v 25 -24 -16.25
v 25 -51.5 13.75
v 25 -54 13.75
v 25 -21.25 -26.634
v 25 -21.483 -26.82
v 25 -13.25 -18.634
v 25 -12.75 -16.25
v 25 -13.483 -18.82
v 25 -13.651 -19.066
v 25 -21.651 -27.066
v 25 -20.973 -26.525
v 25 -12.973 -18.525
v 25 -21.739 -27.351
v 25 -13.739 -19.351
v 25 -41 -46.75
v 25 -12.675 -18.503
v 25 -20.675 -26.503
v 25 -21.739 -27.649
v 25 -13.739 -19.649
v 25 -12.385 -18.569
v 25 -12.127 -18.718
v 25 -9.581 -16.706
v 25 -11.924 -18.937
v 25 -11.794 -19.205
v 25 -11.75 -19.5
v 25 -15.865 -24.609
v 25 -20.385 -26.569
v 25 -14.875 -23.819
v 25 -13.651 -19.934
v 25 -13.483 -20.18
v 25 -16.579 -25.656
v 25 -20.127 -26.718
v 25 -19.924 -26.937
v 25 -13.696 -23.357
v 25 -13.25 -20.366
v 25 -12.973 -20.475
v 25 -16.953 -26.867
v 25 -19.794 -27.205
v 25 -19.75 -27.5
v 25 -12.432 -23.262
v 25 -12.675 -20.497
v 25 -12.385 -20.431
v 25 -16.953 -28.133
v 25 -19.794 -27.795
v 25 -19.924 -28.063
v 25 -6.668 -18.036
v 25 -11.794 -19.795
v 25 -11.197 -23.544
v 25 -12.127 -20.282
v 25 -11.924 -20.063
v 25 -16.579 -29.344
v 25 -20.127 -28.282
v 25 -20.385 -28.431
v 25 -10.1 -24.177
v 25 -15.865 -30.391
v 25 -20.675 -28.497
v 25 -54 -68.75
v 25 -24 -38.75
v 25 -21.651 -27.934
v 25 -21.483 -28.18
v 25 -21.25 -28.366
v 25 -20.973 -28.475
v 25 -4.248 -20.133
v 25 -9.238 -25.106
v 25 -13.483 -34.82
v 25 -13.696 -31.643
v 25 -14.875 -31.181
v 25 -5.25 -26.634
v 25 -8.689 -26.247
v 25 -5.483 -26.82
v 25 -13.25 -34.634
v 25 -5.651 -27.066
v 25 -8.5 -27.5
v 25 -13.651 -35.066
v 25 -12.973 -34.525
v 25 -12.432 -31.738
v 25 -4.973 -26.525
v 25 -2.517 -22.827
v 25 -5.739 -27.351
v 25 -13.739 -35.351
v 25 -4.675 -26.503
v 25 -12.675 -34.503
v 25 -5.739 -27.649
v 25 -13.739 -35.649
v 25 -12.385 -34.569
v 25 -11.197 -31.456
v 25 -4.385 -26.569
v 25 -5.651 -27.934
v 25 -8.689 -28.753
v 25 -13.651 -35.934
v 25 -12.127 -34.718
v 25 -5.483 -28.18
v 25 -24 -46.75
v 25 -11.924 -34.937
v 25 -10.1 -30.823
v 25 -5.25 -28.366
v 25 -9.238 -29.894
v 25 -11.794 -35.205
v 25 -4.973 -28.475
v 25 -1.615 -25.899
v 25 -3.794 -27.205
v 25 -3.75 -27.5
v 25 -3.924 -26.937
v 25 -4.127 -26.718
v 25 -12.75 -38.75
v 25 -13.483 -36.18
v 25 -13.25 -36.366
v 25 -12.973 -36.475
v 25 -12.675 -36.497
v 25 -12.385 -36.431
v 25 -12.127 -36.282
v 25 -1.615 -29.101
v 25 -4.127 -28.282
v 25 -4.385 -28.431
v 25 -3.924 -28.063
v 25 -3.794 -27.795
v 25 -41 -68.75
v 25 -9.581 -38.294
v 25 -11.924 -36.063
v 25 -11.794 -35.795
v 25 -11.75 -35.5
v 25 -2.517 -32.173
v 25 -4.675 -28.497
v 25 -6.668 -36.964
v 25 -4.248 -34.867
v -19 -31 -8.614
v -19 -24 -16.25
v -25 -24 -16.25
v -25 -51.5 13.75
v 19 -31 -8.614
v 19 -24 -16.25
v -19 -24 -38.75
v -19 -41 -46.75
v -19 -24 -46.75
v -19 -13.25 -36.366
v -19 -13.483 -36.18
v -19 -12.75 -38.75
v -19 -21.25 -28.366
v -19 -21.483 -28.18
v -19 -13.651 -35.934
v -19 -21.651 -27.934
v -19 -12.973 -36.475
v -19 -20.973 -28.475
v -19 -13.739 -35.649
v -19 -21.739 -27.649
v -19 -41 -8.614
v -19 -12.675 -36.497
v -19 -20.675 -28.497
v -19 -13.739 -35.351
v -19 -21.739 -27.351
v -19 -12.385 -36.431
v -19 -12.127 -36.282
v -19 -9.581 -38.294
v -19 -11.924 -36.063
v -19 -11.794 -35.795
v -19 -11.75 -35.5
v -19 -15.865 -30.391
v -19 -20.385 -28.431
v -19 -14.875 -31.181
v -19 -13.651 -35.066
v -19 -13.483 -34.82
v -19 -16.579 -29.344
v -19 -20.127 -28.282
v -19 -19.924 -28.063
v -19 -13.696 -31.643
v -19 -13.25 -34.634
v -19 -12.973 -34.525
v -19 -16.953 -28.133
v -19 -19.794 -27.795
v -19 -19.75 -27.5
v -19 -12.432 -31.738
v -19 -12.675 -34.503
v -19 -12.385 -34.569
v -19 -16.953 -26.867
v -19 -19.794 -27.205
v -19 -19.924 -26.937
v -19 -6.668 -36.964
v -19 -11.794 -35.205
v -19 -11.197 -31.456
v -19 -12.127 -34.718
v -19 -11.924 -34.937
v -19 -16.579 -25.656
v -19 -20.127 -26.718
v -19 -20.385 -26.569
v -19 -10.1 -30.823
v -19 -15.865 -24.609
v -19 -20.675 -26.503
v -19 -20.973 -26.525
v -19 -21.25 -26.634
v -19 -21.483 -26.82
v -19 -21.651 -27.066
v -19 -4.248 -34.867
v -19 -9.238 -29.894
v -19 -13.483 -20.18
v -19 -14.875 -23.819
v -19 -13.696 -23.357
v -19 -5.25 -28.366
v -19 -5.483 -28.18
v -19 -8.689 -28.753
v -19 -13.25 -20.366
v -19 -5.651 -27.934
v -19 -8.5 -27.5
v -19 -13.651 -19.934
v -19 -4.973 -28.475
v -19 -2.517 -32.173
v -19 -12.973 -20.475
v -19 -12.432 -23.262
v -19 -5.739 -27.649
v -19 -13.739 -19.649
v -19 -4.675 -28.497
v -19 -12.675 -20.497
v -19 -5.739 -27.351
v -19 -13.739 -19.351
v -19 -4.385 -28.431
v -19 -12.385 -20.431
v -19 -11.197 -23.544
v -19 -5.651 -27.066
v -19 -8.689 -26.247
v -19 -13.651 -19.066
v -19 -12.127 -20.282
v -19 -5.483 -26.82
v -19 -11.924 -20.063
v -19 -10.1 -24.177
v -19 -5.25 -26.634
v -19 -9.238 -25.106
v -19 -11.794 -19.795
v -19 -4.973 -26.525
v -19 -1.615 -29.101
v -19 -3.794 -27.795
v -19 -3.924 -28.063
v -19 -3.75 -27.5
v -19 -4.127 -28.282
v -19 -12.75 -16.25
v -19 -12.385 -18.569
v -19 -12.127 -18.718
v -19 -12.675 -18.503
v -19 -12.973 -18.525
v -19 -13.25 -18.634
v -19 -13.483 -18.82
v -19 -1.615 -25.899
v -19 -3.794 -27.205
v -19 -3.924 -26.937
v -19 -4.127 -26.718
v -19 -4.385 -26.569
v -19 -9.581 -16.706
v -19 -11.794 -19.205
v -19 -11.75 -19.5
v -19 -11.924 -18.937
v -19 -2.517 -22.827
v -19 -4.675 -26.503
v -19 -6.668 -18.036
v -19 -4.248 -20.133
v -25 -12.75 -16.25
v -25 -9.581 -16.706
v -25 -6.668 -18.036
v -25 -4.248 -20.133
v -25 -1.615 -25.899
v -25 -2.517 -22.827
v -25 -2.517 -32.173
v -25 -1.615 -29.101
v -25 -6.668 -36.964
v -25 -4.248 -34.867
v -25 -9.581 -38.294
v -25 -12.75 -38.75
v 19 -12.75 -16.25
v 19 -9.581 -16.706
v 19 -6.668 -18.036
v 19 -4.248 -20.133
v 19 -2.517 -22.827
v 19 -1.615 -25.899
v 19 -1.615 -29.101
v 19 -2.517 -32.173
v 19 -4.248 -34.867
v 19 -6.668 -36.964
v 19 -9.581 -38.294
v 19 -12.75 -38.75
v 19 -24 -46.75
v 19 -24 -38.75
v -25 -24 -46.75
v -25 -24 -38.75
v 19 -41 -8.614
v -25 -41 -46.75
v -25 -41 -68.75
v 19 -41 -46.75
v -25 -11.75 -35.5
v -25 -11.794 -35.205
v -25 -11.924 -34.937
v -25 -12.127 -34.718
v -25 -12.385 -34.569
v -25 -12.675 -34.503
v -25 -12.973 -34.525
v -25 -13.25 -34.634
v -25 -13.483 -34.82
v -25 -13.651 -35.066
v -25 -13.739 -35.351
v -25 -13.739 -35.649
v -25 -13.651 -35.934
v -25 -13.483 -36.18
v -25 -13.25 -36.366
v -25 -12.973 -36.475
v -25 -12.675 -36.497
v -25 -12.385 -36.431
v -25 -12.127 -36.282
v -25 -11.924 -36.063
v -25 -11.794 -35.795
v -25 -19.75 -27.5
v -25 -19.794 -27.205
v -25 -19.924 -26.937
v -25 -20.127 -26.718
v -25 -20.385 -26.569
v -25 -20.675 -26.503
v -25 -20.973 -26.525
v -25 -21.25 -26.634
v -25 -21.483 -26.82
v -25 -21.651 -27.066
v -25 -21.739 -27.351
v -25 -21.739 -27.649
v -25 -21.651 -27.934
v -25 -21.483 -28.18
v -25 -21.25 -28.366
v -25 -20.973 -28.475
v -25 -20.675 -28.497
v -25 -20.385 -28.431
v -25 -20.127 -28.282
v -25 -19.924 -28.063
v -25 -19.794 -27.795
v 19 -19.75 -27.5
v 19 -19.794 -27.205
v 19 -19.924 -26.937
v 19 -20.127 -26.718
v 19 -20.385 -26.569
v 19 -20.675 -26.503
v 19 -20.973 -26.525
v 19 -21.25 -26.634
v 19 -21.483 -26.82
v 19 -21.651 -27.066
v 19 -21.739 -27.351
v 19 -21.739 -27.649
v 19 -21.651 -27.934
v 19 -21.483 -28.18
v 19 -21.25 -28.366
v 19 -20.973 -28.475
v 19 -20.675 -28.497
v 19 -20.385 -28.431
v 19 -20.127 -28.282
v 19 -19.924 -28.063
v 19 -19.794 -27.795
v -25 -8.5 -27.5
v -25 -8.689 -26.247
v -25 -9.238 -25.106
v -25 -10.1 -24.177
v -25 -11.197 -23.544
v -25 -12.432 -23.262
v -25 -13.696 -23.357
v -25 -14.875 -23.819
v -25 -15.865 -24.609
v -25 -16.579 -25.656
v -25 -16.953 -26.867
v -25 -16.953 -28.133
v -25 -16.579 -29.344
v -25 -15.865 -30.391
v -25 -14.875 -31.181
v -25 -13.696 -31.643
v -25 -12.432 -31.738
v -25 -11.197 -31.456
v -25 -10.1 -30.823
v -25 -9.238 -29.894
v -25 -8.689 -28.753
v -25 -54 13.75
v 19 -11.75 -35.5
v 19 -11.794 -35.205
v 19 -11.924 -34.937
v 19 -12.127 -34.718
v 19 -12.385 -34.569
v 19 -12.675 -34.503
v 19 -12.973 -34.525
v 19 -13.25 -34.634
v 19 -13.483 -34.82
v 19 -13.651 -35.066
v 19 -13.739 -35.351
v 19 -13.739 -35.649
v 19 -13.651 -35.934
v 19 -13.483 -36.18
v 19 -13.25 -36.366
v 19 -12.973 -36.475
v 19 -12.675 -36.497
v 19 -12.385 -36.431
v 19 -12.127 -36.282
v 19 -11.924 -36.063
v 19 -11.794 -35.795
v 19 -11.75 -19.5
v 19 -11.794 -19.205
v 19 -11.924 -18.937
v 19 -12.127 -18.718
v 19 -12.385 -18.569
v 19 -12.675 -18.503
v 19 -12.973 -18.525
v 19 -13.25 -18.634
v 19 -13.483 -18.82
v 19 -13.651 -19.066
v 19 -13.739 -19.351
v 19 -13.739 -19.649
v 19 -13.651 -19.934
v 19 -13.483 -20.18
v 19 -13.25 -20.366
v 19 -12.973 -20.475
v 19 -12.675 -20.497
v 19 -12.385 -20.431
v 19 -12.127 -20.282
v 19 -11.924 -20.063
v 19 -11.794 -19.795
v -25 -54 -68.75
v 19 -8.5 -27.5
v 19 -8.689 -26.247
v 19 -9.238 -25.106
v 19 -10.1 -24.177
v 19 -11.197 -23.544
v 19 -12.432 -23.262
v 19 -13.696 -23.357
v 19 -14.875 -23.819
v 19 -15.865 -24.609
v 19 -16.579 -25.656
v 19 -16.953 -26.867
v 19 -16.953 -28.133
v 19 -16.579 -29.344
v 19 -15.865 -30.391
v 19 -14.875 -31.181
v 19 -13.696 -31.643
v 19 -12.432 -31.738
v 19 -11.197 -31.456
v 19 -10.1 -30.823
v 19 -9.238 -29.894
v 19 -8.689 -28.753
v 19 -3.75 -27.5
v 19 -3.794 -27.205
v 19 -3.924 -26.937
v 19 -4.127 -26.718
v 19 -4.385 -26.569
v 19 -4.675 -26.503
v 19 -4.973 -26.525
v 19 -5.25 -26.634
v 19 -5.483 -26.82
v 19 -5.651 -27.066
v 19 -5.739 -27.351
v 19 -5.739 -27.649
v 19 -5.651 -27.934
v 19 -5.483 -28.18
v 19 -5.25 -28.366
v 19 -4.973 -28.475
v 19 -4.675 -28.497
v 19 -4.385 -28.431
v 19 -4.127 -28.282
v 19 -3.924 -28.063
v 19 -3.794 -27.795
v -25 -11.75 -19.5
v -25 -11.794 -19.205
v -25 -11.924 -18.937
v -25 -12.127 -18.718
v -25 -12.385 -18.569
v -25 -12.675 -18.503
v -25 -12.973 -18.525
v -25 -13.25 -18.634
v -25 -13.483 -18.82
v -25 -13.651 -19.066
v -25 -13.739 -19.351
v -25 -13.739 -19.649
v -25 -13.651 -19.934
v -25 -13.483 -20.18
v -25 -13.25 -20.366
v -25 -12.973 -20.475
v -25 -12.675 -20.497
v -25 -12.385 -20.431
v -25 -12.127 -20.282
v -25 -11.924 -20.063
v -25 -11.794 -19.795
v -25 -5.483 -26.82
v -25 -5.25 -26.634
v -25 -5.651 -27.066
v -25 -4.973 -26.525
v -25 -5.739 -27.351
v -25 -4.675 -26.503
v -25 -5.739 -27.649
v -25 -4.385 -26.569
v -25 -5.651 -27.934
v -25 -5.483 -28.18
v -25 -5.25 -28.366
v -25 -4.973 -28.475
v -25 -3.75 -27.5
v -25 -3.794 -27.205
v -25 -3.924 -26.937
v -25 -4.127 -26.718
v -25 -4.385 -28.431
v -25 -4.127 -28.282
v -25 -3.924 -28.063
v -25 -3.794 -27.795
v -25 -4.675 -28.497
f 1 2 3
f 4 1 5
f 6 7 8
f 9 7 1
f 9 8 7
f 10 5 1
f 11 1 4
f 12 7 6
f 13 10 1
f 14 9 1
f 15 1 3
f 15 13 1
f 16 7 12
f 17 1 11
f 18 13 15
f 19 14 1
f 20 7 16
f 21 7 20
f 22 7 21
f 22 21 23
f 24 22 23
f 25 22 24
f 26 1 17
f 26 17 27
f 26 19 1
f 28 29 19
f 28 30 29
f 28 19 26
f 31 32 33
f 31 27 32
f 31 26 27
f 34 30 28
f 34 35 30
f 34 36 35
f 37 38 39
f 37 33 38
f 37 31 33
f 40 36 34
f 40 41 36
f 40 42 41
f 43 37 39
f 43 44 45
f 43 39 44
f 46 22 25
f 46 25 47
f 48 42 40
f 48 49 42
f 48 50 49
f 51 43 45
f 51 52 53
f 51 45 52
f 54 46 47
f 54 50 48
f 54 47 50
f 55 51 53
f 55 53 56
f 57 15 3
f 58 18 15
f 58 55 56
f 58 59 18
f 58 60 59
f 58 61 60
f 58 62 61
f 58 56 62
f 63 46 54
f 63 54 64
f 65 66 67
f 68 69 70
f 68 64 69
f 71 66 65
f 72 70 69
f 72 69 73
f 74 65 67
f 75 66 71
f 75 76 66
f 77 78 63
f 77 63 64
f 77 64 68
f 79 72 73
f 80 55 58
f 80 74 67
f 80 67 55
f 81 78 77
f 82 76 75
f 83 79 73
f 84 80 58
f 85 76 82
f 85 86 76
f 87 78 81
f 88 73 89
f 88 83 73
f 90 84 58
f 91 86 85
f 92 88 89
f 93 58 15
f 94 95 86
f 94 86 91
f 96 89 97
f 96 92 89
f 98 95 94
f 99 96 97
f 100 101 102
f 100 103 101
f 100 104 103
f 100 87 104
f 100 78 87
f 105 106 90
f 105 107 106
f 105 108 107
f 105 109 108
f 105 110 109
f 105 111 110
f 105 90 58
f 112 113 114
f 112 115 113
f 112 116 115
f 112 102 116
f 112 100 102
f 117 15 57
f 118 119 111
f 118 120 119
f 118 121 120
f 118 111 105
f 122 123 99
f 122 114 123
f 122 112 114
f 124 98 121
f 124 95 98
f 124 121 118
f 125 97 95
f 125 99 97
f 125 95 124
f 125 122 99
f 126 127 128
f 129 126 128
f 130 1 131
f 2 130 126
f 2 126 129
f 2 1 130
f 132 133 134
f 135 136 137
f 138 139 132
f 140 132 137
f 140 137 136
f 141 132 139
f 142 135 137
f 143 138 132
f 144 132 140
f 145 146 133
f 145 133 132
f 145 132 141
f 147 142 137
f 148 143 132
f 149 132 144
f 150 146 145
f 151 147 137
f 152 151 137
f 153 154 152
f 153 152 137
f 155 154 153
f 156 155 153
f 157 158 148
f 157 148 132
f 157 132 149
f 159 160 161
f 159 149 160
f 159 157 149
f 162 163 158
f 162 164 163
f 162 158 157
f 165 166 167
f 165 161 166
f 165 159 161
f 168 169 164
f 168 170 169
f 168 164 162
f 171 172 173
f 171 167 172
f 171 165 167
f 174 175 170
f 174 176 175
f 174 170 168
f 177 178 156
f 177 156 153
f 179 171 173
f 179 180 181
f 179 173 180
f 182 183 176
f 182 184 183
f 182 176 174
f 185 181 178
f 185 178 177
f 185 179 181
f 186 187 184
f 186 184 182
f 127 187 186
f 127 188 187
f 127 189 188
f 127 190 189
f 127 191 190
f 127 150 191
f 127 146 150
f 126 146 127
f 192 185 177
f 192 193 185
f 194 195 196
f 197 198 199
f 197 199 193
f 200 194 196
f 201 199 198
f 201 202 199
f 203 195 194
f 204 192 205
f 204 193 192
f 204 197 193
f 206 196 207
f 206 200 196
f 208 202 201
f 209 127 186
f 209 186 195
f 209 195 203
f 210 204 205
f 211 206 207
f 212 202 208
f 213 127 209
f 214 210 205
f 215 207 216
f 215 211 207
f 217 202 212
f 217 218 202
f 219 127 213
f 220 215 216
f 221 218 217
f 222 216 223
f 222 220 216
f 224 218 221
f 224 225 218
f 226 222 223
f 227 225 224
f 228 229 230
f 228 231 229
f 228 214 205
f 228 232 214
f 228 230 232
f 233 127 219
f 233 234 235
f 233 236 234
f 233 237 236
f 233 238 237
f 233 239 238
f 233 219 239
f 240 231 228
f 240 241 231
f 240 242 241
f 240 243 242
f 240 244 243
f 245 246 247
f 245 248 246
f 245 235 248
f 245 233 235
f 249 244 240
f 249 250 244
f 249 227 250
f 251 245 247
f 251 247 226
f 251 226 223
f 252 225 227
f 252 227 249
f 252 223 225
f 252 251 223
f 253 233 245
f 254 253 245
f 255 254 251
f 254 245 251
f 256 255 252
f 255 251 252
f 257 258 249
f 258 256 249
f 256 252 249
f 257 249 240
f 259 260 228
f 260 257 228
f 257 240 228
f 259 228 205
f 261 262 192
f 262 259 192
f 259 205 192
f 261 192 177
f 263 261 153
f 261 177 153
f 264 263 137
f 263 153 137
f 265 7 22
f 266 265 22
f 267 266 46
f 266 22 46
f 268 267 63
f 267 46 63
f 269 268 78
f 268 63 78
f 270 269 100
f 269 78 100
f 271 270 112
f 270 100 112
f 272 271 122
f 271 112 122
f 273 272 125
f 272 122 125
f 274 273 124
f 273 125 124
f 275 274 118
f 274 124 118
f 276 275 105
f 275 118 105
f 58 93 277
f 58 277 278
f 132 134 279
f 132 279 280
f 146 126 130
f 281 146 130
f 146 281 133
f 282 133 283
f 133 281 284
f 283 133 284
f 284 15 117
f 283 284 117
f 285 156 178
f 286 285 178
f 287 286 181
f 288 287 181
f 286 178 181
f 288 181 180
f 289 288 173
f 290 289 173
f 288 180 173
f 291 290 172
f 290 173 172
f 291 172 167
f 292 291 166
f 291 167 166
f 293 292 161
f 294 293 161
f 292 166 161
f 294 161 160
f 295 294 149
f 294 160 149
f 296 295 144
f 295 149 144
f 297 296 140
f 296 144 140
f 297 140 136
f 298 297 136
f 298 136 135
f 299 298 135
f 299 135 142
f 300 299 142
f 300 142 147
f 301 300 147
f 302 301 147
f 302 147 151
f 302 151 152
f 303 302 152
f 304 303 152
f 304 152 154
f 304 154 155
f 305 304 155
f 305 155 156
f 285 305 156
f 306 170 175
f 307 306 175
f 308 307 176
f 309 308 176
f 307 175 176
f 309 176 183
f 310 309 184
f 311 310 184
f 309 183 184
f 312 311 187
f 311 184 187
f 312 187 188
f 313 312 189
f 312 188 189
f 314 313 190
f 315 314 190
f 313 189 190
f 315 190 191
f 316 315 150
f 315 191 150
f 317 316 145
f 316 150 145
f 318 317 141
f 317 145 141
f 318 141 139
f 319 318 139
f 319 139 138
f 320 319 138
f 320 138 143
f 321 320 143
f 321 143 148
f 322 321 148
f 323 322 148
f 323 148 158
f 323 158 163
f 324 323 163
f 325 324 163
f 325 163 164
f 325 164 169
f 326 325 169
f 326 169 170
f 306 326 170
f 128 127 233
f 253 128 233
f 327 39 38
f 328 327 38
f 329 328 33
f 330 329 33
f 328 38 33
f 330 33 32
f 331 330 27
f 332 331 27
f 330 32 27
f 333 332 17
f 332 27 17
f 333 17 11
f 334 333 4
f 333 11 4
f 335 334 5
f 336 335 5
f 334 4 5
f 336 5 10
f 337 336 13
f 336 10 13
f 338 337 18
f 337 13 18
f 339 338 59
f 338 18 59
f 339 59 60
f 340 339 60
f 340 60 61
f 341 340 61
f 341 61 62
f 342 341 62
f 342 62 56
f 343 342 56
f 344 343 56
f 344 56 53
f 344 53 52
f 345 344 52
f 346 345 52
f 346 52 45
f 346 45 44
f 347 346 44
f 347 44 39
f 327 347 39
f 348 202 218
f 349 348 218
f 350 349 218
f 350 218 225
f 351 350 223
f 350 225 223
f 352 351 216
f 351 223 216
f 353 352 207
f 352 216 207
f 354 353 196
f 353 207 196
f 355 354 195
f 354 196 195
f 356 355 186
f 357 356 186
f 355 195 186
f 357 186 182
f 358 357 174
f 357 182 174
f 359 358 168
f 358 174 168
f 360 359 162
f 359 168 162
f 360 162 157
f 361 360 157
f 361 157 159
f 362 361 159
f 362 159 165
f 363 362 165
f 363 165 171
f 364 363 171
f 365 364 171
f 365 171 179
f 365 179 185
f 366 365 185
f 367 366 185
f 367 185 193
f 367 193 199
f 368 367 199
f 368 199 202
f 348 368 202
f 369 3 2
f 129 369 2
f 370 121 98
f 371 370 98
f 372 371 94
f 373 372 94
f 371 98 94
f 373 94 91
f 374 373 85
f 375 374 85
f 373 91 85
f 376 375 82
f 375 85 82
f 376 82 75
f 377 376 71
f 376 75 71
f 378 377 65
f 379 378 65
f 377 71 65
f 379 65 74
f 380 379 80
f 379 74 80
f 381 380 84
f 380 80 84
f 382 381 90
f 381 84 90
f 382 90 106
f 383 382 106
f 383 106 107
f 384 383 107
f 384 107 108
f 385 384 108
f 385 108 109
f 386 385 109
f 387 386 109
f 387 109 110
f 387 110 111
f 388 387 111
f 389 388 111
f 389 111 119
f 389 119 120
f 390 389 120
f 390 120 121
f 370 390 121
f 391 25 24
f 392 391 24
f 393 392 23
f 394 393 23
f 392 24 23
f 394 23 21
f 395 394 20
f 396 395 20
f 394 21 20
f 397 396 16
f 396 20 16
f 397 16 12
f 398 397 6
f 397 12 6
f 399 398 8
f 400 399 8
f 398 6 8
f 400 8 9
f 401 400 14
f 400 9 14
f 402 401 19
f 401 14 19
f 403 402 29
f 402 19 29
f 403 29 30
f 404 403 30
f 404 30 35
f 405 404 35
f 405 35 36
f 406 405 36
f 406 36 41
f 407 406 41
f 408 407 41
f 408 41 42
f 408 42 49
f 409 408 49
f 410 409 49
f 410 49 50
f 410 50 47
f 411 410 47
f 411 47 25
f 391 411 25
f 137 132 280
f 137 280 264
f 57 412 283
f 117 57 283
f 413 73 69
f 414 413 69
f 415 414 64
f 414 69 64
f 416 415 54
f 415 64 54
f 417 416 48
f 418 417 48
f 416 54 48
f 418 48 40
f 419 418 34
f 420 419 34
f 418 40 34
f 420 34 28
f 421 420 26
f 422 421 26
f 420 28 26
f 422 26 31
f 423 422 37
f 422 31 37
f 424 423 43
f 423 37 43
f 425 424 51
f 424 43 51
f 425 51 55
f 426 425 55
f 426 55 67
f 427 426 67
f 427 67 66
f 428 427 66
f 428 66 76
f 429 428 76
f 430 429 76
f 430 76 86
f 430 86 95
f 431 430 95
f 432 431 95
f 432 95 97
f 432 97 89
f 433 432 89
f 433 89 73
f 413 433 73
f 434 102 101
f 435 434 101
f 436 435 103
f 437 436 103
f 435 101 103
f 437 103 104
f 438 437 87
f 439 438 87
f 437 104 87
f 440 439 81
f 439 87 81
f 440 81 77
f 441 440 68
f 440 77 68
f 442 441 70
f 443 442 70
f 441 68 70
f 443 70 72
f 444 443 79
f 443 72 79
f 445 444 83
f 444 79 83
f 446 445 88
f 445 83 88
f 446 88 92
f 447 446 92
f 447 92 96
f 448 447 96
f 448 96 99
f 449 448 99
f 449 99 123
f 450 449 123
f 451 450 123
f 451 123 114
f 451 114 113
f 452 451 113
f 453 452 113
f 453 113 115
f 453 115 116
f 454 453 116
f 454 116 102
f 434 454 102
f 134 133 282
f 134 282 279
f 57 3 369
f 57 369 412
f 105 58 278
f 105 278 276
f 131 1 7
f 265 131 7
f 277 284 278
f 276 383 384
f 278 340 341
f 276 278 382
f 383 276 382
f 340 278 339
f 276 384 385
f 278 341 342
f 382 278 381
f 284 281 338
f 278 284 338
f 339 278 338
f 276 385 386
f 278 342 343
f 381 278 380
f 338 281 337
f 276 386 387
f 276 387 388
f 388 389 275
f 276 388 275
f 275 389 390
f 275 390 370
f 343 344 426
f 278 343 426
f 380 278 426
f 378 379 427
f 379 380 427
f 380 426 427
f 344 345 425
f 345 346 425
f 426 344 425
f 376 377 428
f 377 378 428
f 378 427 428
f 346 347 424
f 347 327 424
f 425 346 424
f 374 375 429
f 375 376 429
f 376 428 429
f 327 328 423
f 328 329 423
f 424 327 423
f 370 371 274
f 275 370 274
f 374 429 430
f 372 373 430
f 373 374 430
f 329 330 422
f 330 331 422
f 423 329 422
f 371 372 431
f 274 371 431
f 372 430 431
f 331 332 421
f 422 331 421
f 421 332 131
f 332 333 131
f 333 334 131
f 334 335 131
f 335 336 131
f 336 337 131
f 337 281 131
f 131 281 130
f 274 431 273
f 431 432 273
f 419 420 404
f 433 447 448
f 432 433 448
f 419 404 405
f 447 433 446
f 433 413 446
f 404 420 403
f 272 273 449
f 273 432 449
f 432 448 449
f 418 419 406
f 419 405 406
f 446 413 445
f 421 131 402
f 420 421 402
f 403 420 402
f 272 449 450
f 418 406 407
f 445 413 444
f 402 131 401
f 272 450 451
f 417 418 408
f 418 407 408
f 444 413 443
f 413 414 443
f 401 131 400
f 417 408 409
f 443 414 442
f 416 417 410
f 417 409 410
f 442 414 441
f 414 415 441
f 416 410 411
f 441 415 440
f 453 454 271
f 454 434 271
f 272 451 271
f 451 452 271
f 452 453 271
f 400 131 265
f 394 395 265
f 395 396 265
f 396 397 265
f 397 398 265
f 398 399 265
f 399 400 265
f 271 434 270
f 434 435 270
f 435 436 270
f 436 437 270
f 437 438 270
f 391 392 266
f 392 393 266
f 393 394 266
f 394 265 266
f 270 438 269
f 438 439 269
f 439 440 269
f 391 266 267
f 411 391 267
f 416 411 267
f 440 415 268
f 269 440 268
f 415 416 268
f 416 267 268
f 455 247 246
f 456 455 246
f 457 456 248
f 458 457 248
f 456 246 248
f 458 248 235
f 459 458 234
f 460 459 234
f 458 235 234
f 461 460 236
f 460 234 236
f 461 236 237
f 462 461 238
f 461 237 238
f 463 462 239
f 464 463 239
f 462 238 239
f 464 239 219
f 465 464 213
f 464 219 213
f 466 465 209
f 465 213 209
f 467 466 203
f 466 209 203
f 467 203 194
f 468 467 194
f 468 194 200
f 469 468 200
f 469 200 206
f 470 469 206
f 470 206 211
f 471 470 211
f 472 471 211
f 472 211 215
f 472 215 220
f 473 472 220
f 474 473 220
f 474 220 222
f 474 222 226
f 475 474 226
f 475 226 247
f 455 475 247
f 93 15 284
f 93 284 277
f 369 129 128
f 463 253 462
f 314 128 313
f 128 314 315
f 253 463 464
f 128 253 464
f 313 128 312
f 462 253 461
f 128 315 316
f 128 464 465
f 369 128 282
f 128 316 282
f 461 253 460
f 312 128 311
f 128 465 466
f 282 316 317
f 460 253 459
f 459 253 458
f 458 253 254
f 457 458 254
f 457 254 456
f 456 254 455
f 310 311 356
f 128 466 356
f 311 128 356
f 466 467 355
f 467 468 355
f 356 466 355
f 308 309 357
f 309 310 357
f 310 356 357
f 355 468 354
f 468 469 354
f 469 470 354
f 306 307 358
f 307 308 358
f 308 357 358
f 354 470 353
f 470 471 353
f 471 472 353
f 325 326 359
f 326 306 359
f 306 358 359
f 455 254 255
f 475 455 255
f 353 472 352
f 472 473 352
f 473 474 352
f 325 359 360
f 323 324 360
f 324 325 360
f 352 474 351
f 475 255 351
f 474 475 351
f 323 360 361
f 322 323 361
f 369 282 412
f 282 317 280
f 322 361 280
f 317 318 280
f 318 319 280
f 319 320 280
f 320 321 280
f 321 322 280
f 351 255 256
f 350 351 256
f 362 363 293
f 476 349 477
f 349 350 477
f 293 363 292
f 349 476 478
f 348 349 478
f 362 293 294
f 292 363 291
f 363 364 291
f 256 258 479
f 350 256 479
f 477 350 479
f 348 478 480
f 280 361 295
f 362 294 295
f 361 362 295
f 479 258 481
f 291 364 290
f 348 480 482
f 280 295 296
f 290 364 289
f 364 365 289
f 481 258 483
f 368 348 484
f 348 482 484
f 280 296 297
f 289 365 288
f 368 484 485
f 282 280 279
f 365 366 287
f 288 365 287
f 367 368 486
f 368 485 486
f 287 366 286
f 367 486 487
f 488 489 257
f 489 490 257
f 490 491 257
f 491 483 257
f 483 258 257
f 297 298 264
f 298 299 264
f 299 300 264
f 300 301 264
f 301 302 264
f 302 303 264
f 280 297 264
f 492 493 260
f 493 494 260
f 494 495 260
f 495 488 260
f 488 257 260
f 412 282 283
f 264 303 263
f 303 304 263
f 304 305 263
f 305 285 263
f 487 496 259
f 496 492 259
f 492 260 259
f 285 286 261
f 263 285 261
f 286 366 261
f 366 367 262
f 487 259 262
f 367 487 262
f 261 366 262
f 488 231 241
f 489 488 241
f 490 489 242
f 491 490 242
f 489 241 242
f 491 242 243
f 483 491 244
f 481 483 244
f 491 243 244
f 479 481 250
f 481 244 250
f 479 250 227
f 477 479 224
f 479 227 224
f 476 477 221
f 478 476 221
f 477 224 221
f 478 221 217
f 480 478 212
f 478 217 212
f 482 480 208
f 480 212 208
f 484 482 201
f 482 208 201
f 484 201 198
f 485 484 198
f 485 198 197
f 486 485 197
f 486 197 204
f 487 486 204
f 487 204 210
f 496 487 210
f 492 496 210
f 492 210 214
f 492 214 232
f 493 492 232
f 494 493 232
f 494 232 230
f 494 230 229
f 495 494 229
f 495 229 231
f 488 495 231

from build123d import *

# Parameters (mm, degrees)
SKETCH1_W           = 50
SKETCH1_H           = 170
BOSS_EXTRUDE1_DEPTH = 55
SKETCH2_W           = 34
SKETCH2_H           = 27
CUT_EXTRUDE1_DEPTH  = 181.416185527
SKETCH3_W           = 10
SKETCH3_H           = 24
SKETCH3_R           = 4.25
SKETCH3_R_2         = 1
CUT_EXTRUDE2_DEPTH  = 186.539753153
SKETCH4_W           = 2
SKETCH4_H           = 24
CUT_EXTRUDE3_DEPTH  = 178.623196683
SKETCH5_W           = 6.25
SKETCH5_H           = 11.25
CUT_EXTRUDE4_DEPTH  = 186.539753153
SKETCH6_W           = 38
SKETCH6_H           = 10
CUT_EXTRUDE5_DEPTH  = 181.416185527
SKETCH8_W           = 13.25
SKETCH8_H           = 2.25
CUT_EXTRUDE7_DEPTH  = 186.539753153
SKETCH9_W           = 34
SKETCH9_H           = 35.25
CUT_EXTRUDE8_DEPTH  = 179.297679458
SKETCH11_W          = 13.25
SKETCH11_H          = 20.25
CUT_EXTRUDE9_DEPTH  = 184.480414486
SKETCH12_W          = 28.5
SKETCH12_H          = 15
BOSS_EXTRUDE2_DEPTH = 8
SKETCH14_W          = 34
SKETCH14_H          = 15
SKETCH14_H_2        = 10.25
BOSS_EXTRUDE3_DEPTH = 13.25
SKETCH16_R          = 4.5
SKETCH16_R_2        = 2.5
CUT_EXTRUDE13_DEPTH = 8
SKETCH17_R          = 4.5
SKETCH17_W          = 55
SKETCH17_H          = 10.25
CUT_EXTRUDE15_DEPTH = 175.384811552
SKETCH18_W          = 71.25
SKETCH18_H          = 27.5
SKETCH18_W_2        = 13.75
SKETCH18_W_3        = 16.25
BOSS_EXTRUDE4_DEPTH = 50
SKETCH19_W          = 38
SKETCH19_H          = 7
CUT_EXTRUDE16_DEPTH = 152.25227271
SKETCH20_W          = 57.5
SKETCH20_H          = 27.5
CUT_EXTRUDE17_DEPTH = 102.137591923
CUT_EXTRUDE18_DEPTH = 100.39221549
SKETCH22_W          = 82.5
SKETCH22_H          = 2.5
BOSS_EXTRUDE5_DEPTH = 50
SKETCH24_W          = 22
SKETCH24_H          = 17
CUT_EXTRUDE19_DEPTH = 101.710289941
SKETCH25_W          = 38
SKETCH25_H          = 38.136363636
CUT_EXTRUDE20_DEPTH = 10


with BuildPart() as part:
    # Sketch1 → Boss-Extrude1 (new body)
    with BuildSketch(Plane.XY):
        with Locations((0, -85)):
            Rectangle(SKETCH1_W, SKETCH1_H)
    extrude(amount=-BOSS_EXTRUDE1_DEPTH)

    # Sketch2 → Cut-Extrude1 (cut, through all)
    with BuildSketch(Plane.XY):
        with Locations((0, -13.5)):
            Rectangle(SKETCH2_W, SKETCH2_H)
    extrude(amount=-CUT_EXTRUDE1_DEPTH, mode=Mode.SUBTRACT)

    # Sketch3 → Cut-Extrude2 (cut, through all)
    with BuildSketch(Plane(origin=(25, 0, 0), x_dir=(0, 0, -1), z_dir=(1, 0, 0))):
        with Locations((50, -12)):
            Rectangle(SKETCH3_W, SKETCH3_H)
        with Locations((5, -12)):
            Rectangle(SKETCH3_W, SKETCH3_H)
        with Locations(Location((27.5, -12.75, 0), (0, 0, 90))):
            Circle(SKETCH3_R)
        with Locations(Location((35.5, -12.75, 0), (0, 0, 90))):
            Circle(SKETCH3_R_2)
        with Locations(Location((27.5, -4.75, 0), (0, 0, 90))):
            Circle(SKETCH3_R_2)
        with Locations(Location((27.5, -20.75, 0), (0, 0, 90))):
            Circle(SKETCH3_R_2)
        with Locations(Location((19.5, -12.75, 0), (0, 0, 90))):
            Circle(SKETCH3_R_2)
    extrude(amount=-CUT_EXTRUDE2_DEPTH, mode=Mode.SUBTRACT)

    # Sketch4 → Cut-Extrude3 (cut, through all)
    with BuildSketch(Plane.XY.offset(-10)):
        with Locations((-18, -12)):
            Rectangle(SKETCH4_W, SKETCH4_H)
        with Locations((18, -12)):
            Rectangle(SKETCH4_W, SKETCH4_H)
    extrude(amount=-CUT_EXTRUDE3_DEPTH, mode=Mode.SUBTRACT)

    # Sketch5 → Cut-Extrude4 (cut, through all)
    with BuildSketch(Plane(origin=(25, 0, 0), x_dir=(0, 0, -1), z_dir=(1, 0, 0))):
        with BuildLine():
            Line((45, 0), (10, 0))
            Line((10, 0), (10, -12.75))
            Line((10, -12.75), (16.25, -12.75))
            ThreePointArc((16.25, -12.75), (27.5, -1.5), (38.75, -12.75))
            Line((38.75, -12.75), (45, -12.75))
            Line((45, -12.75), (45, 0))
        make_face()
        with Locations((13.125, -18.375)):
            Rectangle(SKETCH5_W, SKETCH5_H)
        with Locations((41.875, -18.375)):
            Rectangle(SKETCH5_W, SKETCH5_H)
    extrude(amount=-CUT_EXTRUDE4_DEPTH, mode=Mode.SUBTRACT)

    # Sketch6 → Cut-Extrude5 (cut, through all)
    with BuildSketch(Plane.XY):
        with Locations((0, -29)):
            Rectangle(SKETCH6_W, SKETCH6_H)
    extrude(amount=-CUT_EXTRUDE5_DEPTH, mode=Mode.SUBTRACT)

    # Sketch8 → Cut-Extrude7 (cut, through all)
    with BuildSketch(Plane(origin=(25, 0, 0), x_dir=(0, 0, -1), z_dir=(1, 0, 0))):
        with BuildLine():
            Line((27.5, -157.5), (27.5, -132.5))
            Line((27.5, -132.5), (13.25, -132.5))
            Line((13.25, -132.5), (13.25, -167.75))
            Line((13.25, -167.75), (17.25, -167.75))
            ThreePointArc((17.25, -167.75), (20.252155493, -160.502155493), (27.5, -157.5))
        make_face()
        with BuildLine():
            Line((41.75, -167.75), (41.75, -132.5))
            Line((41.75, -132.5), (27.5, -132.5))
            Line((27.5, -132.5), (27.5, -157.5))
            ThreePointArc((27.5, -157.5), (34.747844507, -160.502155493), (37.75, -167.75))
            Line((37.75, -167.75), (41.75, -167.75))
        make_face()
        with Locations((48.375, -168.875)):
            Rectangle(SKETCH8_W, SKETCH8_H)
        with Locations((6.625, -168.875)):
            Rectangle(SKETCH8_W, SKETCH8_H)
        with BuildLine():
            Line((17.25, -167.75), (13.25, -167.75))
            Line((13.25, -167.75), (13.25, -170))
            Line((13.25, -170), (17.5, -170))
            ThreePointArc((17.5, -170), (17.31269172, -168.881923142), (17.25, -167.75))
        make_face()
        with BuildLine():
            Line((41.75, -170), (41.75, -167.75))
            Line((41.75, -167.75), (37.75, -167.75))
            ThreePointArc((37.75, -167.75), (37.68730828, -168.881923142), (37.5, -170))
            Line((37.5, -170), (41.75, -170))
        make_face()
        with BuildLine():
            Line((27.5, -167.75), (27.5, -157.5))
            ThreePointArc((27.5, -157.5), (20.252155493, -160.502155493), (17.25, -167.75))
            Line((17.25, -167.75), (27.5, -167.75))
        make_face()
        with BuildLine():
            ThreePointArc((37.75, -167.75), (34.747844507, -160.502155493), (27.5, -157.5))
            Line((27.5, -157.5), (27.5, -167.75))
            Line((27.5, -167.75), (37.75, -167.75))
        make_face()
        with BuildLine():
            Line((27.5, -170), (27.5, -167.75))
            Line((27.5, -167.75), (17.25, -167.75))
            ThreePointArc((17.25, -167.75), (17.31269172, -168.881923142), (17.5, -170))
            Line((17.5, -170), (27.5, -170))
        make_face()
        with BuildLine():
            ThreePointArc((37.5, -170), (37.68730828, -168.881923142), (37.75, -167.75))
            Line((37.75, -167.75), (27.5, -167.75))
            Line((27.5, -167.75), (27.5, -170))
            Line((27.5, -170), (37.5, -170))
        make_face()
    extrude(amount=-CUT_EXTRUDE7_DEPTH, mode=Mode.SUBTRACT)

    # Sketch9 → Cut-Extrude8 (cut, through all)
    with BuildSketch(Plane.XY):
        with Locations((0, -150.125)):
            Rectangle(SKETCH9_W, SKETCH9_H)
    extrude(amount=-CUT_EXTRUDE8_DEPTH, mode=Mode.SUBTRACT)

    # Sketch11 → Cut-Extrude9 (cut, through all)
    with BuildSketch(Plane(origin=(25, 0, 0), x_dir=(0, 0, -1), z_dir=(1, 0, 0))):
        with BuildLine():
            ThreePointArc((17.25, -167.75), (20.252155493, -160.502155493), (27.5, -157.5))
            Line((27.5, -157.5), (27.5, -147.5))
            Line((27.5, -147.5), (13.25, -147.5))
            Line((13.25, -147.5), (13.25, -167.75))
            Line((13.25, -167.75), (17.25, -167.75))
        make_face()
        with BuildLine():
            Line((27.5, -147.5), (27.5, -157.5))
            ThreePointArc((27.5, -157.5), (34.747844507, -160.502155493), (37.75, -167.75))
            Line((37.75, -167.75), (41.75, -167.75))
            Line((41.75, -167.75), (41.75, -147.5))
            Line((41.75, -147.5), (27.5, -147.5))
        make_face()
        with Locations((48.375, -157.625)):
            Rectangle(SKETCH11_W, SKETCH11_H)
        with Locations((6.625, -157.625)):
            Rectangle(SKETCH11_W, SKETCH11_H)
    extrude(amount=-CUT_EXTRUDE9_DEPTH, mode=Mode.SUBTRACT)

    # Sketch12 → Boss-Extrude2 (add)
    with BuildSketch(Plane(origin=(25, 0, 0), x_dir=(0, 0, -1), z_dir=(1, 0, 0))):
        with Locations((27.5, -140)):
            Rectangle(SKETCH12_W, SKETCH12_H)
    boss_extrude2 = extrude(amount=-BOSS_EXTRUDE2_DEPTH)

    # Mirror1: Boss-Extrude2 across plane
    add(boss_extrude2.mirror(Plane(origin=(0, 0, 0), x_dir=(0, 0, 1), z_dir=(1, 0, 0))))

    # Sketch14 → Boss-Extrude3 (add)
    with BuildSketch(Plane.XY):
        with Locations((0, -140)):
            Rectangle(SKETCH14_W, SKETCH14_H)
        with Locations((0, -152.625)):
            Rectangle(SKETCH14_W, SKETCH14_H_2)
    boss_extrude3 = extrude(amount=-BOSS_EXTRUDE3_DEPTH)

    # Mirror2: Boss-Extrude3 across plane
    add(boss_extrude3.mirror(Plane.XY.offset(-27.5)))

    # Sketch16 → Cut-Extrude13 (cut)
    # profile 1 of 3: a face of its own
    with BuildSketch(Plane(origin=(25, 0, 0), x_dir=(0, 0, -1), z_dir=(1, 0, 0))):
        with Locations(Location((16.5, -135.75, 0), (0, 0, 90))):
            Circle(SKETCH16_R)
        with Locations((16.5, -135.75)):
            Circle(SKETCH16_R_2, mode=Mode.SUBTRACT)
    # profile 2 of 3: a face of its own
    with BuildSketch(Plane(origin=(25, 0, 0), x_dir=(0, 0, -1), z_dir=(1, 0, 0))):
        with Locations((16.5, -135.75)):
            Circle(SKETCH16_R_2)
    # profile 3 of 3: a face of its own
    with BuildSketch(Plane(origin=(25, 0, 0), x_dir=(0, 0, -1), z_dir=(1, 0, 0))):
        with Locations(Location((38.5, -135.75, 0), (0, 0, 90))):
            Circle(SKETCH16_R)
    cut_extrude13 = extrude(amount=-CUT_EXTRUDE13_DEPTH, mode=Mode.SUBTRACT)

    # Mirror3: Cut-Extrude13 across plane
    add(cut_extrude13.mirror(Plane(origin=(0, 0, 0), x_dir=(0, 0, 1), z_dir=(1, 0, 0))), mode=Mode.SUBTRACT)

    # Sketch17 → Cut-Extrude15 (cut, through all)
    # profile 1 of 4: a face of its own
    with BuildSketch(Plane(origin=(25, 0, 0), x_dir=(0, 0, -1), z_dir=(1, 0, 0))):
        Polygon((55, -51.5), (27.5, -51.5), (0, -51.5), (0, -147.5), (55, -147.5), align=None)
        with Locations((16.5, -135.75)):
            Circle(SKETCH17_R, mode=Mode.SUBTRACT)
        with Locations((38.5, -135.75)):
            Circle(SKETCH17_R, mode=Mode.SUBTRACT)
    # profile 2 of 4: a face of its own
    with BuildSketch(Plane(origin=(25, 0, 0), x_dir=(0, 0, -1), z_dir=(1, 0, 0))):
        with Locations((27.5, -152.625)):
            Rectangle(SKETCH17_W, SKETCH17_H)
    # profile 3 of 4: a face of its own
    with BuildSketch(Plane(origin=(25, 0, 0), x_dir=(0, 0, -1), z_dir=(1, 0, 0))):
        with Locations((38.5, -135.75)):
            Circle(SKETCH17_R)
    # profile 4 of 4: a face of its own
    with BuildSketch(Plane(origin=(25, 0, 0), x_dir=(0, 0, -1), z_dir=(1, 0, 0))):
        with Locations((16.5, -135.75)):
            Circle(SKETCH17_R)
    extrude(amount=-CUT_EXTRUDE15_DEPTH, mode=Mode.SUBTRACT)

    # Sketch18 → Boss-Extrude4 (add)
    with BuildSketch(Plane(origin=(25, 0, 0), x_dir=(0, 0, -1), z_dir=(1, 0, 0))):
        with Locations((-35.625, -37.75)):
            Rectangle(SKETCH18_W, SKETCH18_H)
        with Locations((61.875, -37.75)):
            Rectangle(SKETCH18_W_2, SKETCH18_H)
        Polygon((38.75, -51.5), (38.75, -24), (16.25, -24), (0, -24), (0, -51.5), align=None)
        with Locations((46.875, -37.75)):
            Rectangle(SKETCH18_W_3, SKETCH18_H)
    extrude(amount=-BOSS_EXTRUDE4_DEPTH)

    # Sketch19 → Cut-Extrude16 (cut, through all)
    with BuildSketch(Plane.XY.offset(71.25)):
        with Locations((0, -27.5)):
            Rectangle(SKETCH19_W, SKETCH19_H)
    extrude(amount=-CUT_EXTRUDE16_DEPTH, mode=Mode.SUBTRACT)

    # Sketch20 → Cut-Extrude17 (cut, through all)
    with BuildSketch(Plane(origin=(25, 0, 0), x_dir=(0, 0, -1), z_dir=(1, 0, 0))):
        with Locations((-42.5, -37.75)):
            Rectangle(SKETCH20_W, SKETCH20_H)
    extrude(amount=-CUT_EXTRUDE17_DEPTH, mode=Mode.SUBTRACT)

    # Sketch21 → Cut-Extrude18 (cut, through all)
    with BuildSketch(Plane(origin=(25, 0, 0), x_dir=(0, 0, -1), z_dir=(1, 0, 0))):
        Polygon((16.25, -24), (-13.75, -51.5), (-13.75, -24), align=None)
    extrude(amount=-CUT_EXTRUDE18_DEPTH, mode=Mode.SUBTRACT)

    # Sketch22 → Boss-Extrude5 (add)
    with BuildSketch(Plane(origin=(25, 0, 0), x_dir=(0, 0, -1), z_dir=(1, 0, 0))):
        with Locations((27.5, -52.75)):
            Rectangle(SKETCH22_W, SKETCH22_H)
    extrude(amount=-BOSS_EXTRUDE5_DEPTH)

    # Sketch24 → Cut-Extrude19 (cut, through all)
    with BuildSketch(Plane(origin=(25, 0, 0), x_dir=(0, 0, -1), z_dir=(1, 0, 0))):
        with Locations((57.75, -32.5)):
            Rectangle(SKETCH24_W, SKETCH24_H)
    extrude(amount=-CUT_EXTRUDE19_DEPTH, mode=Mode.SUBTRACT)

    # Sketch25 → Cut-Extrude20 (cut)
    with BuildSketch(Plane(origin=(0, -31, 0), x_dir=(1, 0, 0), z_dir=(0, 1, 0))):
        with Locations((0, 27.681818182)):
            Rectangle(SKETCH25_W, SKETCH25_H)
    extrude(amount=-CUT_EXTRUDE20_DEPTH, mode=Mode.SUBTRACT)


solid = part.part
